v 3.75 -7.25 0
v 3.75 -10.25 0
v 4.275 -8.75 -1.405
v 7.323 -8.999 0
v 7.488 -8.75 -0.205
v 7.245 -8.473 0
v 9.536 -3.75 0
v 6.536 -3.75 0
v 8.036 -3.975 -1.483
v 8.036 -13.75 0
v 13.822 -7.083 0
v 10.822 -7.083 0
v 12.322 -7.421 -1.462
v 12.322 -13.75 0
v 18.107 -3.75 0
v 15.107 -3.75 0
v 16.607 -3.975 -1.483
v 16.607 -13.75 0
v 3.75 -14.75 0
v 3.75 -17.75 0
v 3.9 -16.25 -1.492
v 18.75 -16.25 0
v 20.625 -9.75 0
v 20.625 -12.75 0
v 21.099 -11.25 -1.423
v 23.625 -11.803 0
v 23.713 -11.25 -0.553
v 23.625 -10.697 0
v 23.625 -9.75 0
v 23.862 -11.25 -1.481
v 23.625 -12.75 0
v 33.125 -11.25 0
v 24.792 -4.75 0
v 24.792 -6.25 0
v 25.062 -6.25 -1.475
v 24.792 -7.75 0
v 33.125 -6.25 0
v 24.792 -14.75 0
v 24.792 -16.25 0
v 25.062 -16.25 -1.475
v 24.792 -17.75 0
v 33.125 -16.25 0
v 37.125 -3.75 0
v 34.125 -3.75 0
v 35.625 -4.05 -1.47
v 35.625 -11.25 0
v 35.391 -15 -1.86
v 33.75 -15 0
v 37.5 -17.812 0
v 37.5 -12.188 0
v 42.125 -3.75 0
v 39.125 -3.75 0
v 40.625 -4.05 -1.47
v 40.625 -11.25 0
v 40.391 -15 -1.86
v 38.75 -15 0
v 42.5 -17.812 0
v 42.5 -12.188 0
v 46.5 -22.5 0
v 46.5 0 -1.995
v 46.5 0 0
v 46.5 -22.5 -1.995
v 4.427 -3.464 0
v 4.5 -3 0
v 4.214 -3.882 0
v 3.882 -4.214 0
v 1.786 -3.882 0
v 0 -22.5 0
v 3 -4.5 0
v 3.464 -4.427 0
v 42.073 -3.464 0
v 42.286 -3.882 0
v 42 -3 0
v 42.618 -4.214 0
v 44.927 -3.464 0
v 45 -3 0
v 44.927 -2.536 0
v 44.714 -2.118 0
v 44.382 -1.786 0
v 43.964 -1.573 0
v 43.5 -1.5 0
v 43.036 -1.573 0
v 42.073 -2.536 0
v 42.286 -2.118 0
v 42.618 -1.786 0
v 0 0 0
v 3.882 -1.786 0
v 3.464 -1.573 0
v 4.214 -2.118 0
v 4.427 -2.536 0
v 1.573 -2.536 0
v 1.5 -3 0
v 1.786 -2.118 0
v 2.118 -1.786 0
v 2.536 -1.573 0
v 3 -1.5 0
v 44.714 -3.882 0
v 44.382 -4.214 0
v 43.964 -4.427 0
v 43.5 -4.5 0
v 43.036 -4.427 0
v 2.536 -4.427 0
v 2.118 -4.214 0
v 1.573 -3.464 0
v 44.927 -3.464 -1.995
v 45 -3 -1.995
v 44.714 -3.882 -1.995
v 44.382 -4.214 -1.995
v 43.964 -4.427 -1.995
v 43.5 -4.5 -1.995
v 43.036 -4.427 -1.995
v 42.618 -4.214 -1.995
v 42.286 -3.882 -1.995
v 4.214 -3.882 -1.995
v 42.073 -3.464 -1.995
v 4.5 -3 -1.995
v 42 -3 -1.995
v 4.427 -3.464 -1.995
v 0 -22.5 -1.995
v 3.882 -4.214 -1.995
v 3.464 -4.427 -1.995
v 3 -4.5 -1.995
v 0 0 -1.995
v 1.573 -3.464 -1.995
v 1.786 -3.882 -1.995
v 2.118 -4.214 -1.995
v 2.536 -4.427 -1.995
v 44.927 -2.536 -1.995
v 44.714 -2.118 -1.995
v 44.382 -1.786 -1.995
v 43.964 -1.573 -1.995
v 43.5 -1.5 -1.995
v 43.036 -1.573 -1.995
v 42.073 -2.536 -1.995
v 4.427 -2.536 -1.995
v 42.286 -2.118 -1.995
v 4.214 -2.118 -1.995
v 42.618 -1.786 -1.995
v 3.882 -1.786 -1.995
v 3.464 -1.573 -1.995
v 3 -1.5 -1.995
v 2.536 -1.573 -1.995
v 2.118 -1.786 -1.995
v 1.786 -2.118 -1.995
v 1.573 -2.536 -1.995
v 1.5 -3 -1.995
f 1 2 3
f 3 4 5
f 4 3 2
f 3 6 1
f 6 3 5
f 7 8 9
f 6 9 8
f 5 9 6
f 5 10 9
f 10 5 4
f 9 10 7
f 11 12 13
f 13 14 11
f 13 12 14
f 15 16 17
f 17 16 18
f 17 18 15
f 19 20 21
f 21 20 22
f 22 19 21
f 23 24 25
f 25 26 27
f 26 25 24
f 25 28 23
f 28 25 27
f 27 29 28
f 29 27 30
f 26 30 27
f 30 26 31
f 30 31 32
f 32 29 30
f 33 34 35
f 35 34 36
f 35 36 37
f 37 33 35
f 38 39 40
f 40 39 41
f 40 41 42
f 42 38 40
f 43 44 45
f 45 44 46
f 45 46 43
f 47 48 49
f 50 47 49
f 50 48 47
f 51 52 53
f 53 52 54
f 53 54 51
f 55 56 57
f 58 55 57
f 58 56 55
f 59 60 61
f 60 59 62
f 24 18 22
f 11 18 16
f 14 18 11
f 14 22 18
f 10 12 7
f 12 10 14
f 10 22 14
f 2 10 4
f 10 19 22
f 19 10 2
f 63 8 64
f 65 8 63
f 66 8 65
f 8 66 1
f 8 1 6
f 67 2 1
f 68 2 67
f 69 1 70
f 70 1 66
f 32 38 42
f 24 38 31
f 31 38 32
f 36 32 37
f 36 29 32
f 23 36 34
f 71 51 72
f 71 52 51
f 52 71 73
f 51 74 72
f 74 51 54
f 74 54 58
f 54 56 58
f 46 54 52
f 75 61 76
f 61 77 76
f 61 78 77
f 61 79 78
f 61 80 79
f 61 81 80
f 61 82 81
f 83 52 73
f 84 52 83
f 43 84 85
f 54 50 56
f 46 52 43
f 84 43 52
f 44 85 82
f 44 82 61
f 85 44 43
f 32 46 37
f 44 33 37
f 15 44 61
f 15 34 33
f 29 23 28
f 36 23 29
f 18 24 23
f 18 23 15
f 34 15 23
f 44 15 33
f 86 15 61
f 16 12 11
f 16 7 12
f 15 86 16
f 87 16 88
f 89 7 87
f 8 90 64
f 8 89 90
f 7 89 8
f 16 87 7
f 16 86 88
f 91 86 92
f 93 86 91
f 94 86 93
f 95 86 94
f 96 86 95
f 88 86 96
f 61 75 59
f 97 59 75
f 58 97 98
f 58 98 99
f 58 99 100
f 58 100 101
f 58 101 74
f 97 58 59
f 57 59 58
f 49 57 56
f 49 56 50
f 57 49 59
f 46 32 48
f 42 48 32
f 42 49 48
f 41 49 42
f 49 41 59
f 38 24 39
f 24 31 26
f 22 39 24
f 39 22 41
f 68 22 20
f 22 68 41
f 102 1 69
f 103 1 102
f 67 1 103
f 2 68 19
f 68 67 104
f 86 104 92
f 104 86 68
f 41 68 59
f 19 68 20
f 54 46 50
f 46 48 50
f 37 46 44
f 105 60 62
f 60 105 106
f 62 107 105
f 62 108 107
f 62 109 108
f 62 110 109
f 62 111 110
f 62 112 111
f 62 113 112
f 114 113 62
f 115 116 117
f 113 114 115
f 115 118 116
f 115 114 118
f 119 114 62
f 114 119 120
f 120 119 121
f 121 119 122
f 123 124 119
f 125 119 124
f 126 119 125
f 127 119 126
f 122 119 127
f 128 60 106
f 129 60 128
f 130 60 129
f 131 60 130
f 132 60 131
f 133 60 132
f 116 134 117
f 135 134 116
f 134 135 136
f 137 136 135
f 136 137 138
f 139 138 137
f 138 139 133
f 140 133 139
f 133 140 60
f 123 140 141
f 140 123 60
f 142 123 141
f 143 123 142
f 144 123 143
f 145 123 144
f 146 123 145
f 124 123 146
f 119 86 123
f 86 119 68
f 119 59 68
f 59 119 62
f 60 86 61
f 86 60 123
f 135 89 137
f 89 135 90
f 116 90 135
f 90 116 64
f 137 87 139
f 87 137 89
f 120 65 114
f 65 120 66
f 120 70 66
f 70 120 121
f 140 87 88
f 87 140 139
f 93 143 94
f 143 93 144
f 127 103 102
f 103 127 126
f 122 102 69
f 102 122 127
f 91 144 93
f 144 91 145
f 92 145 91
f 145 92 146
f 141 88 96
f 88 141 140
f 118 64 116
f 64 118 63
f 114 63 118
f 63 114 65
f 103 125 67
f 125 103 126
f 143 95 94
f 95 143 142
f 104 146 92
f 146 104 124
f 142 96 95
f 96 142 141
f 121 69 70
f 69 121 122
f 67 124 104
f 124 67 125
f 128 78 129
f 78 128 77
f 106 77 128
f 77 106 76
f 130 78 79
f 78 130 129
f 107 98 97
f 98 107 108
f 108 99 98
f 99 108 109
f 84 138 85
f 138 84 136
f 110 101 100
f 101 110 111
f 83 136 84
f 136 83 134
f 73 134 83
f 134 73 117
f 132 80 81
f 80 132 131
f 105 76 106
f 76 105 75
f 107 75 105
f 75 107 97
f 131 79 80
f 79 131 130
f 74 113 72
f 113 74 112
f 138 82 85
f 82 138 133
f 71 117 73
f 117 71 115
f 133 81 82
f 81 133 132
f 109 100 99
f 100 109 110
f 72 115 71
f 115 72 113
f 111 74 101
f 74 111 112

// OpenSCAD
// file: cuneiform.scad
MAX_STROKE_WIDTH = 1/5;

module wedge(x, y, z, w, h, phi, o=false){
	// o is for offset, an experiment with moving the stroke so that its greatest depth would be at the origin point
	// It's not working very well; just don't use it for now
	// Also need to extend the stroke by delta if we do that
	
	s = w / sqrt(2);
	d = w / 2; // Depth of stroke, from head to deepest point
	l = sqrt(h*h - d*d); // Length of stroke, from deepest point to tip
	theta = atan(d/l); // Angle of stylus
	delta = o ? d*sin(theta) : 0; // Horizontal distance from head of wedge to greatest depth

	translate([x, y, z])
	rotate([0, 0, phi])
	translate([-delta, 0, 0])
	rotate([0, -theta, 0])
	rotate([45, 0, 0])
	translate([0, -s/2, -s/2])
	cube([l, s, s]);
}

module haken(x, y, z, s, d){ // Winkelhaken, positioned from top left corner - now called from the more elaborate hookstroke below
	w = s*sqrt(2);
	theta = atan(d/(w/2));
	translate([x, y, z])
	rotate([0, -theta, 0])
	translate([0, 0, -d])
	rotate([0, 0, -45])
	cube([s, s, d]);
}

module singlestroke(x, y, w, h){ // Vertical, positioned from top left corner
	w2 = min(h, w, MAX_STROKE_WIDTH);
	wedge(x+w/2, y, 0, w2, h, 90);
}

module doublestroke(x, y, w, h){
	w2 = min(h, w, MAX_STROKE_WIDTH);
	dist = min(w2, h/4);
	h2 = h - dist;
	h3 = h2 / 2;
	wedge(x+w/2, y, 0, w2, h3, 90);
	wedge(x+w/2, y+dist, 0, w2, h2, 90);
}

module triplestroke(x, y, w, h){
	w2 = min(h, w, MAX_STROKE_WIDTH);
	dist = min(w2, h/4);
	h2 = h - dist*2;
	h3 = min(h2/2, h-dist*2);
	wedge(x+w/2, y, 0, w2, h3, 90);
	wedge(x+w/2, y+dist, 0, w2, h3, 90);
	wedge(x+w/2, y+dist*2, 0, w2, h2, 90);
}

module hookstroke(x, y, w, h, factor=0.75){
//	hh = (w-h/2<0.0001) ? factor*h : h; // By default, the renderer produces hakens that are twice as tall as they are wide - but that means d = 0!
	// We fix this by reducing h by a factor < 1, when this happens
	// Comparing against epsilon instead of zero because transferring numbers from Python to SCAD can do weird things occasionally
	// Experiment: changing w instead of h to make hakens wider, which makes them more visible when they're pressed against verticals
	// Experiment undone - it works better changing h and having an adjustment in the renderer for when it's pressed against a vertical
//	ww = (w-h/2<0.0001) ? w/factor : w;
	ww = w; // We bring in ww and hh because SCAD does single assignment of variables
	hh = (w-h/2<0.0001) ? h*factor : h;
	s = hh / sqrt(2); // Side length of the square we're going to embed
	d = sqrt(ww*ww - hh*hh/4); // Depth that square is going to sink into the tablet
	deltaw = (ww-w);
	haken(x-deltaw, y+h/2, 0, s, d); // Use h instead of hh because the haken() module wants the position of the tip, and that needs to be at the midpoint of the *original* bounding box
}

module hrule(y, w, h=0.05){ // Draw a horizontal rule at a given y-value, spanning a given width; h is the thickness of the rule
	s = h*sqrt(2)/2; // Side length of a square with diagonal h
	translate([0, y, -s])
		rotate([45, 0, 0])
			cube([w, h, h]);
}

module edgerule(y, w, h=0.05, top=true){ // Like hrule except it's cut in half to go at the top and bottom of a cylinder seal
	s = h*sqrt(2)/2;
	translate([0, y, -s])
		difference(){
			rotate([45, 0, 0])
				cube([w, h, h]);
			translate([-0.01, (top ? -h : 0), 0])
				cube([w+0.02, h, 2*h]);
		}
}

module vrule(x, h, w=0.05){ // Vertical rule, like hrule but reversed
	s = w*sqrt(2)/2;
	translate([x, 0, 0]) // TODO why 0 and not -s for the third?
		rotate([0, 45, 0])
			cube([w, h, w]);
}

module hatcharea(x, y, w, h){
	// TODO
}
// main file
use <../3dmodel/cuneiform.scad>

difference(){

union(){
scale([1.5,-1.5,1.5]){
	difference(){
		translate([0,0,-1.33])
			cube([31,15,1.33]);
		union(){
			translate([2.5,2.5,0]){
				scale([10.0,10.0,10.0]){
					translate([0,0,0]){
						rotate(-90.0){
							singlestroke(-0.5, 0, 0.3333333333333333, 0.28570556640625);
						}
						singlestroke(0.14288330078125, 0, 0.28570556640625, 0.6666666666666667);
						singlestroke(0.4285888671875, 0.22222222222222224, 0.28570556640625, 0.44444444444444453);
						singlestroke(0.71429443359375, 0, 0.28570556640625, 0.6666666666666667);
						rotate(-90.0){
							singlestroke(-1.0, 0, 0.3333333333333333, 1);
						}
					}
					translate([1.125,0,0]){
						rotate(-90.0){
							singlestroke(-0.3333333333333333, 0.27777777777777785, 0.3333333333333333, 0.5555555555555556);
						}
						rotate(-90.0){
							doublestroke(-0.6666666666666666, 0, 0.3333333333333333, 0.8333333333333335);
						}
						rotate(-90.0){
							singlestroke(-1.0, 0.27777777777777785, 0.3333333333333333, 0.5555555555555556);
						}
						singlestroke(0.8333333333333335, 0.0, 0.3333333333333333, 0.5);
						hookstroke(0.8750000000000001, 0.5, 0.25, 0.5);
						singlestroke(1.1666666666666667, 0.0, 0.3333333333333333, 0.5);
						hookstroke(1.2083333333333335, 0.5, 0.25, 0.5);
					}
				}
			}
		}
	}
}
}

translate([3, -3, -5]){
	cylinder(h=10, r=1.5, $fn=20);
}
translate([43.5, -3, -5]){
	cylinder(h=10, r=1.5, $fn=20);
}

}
